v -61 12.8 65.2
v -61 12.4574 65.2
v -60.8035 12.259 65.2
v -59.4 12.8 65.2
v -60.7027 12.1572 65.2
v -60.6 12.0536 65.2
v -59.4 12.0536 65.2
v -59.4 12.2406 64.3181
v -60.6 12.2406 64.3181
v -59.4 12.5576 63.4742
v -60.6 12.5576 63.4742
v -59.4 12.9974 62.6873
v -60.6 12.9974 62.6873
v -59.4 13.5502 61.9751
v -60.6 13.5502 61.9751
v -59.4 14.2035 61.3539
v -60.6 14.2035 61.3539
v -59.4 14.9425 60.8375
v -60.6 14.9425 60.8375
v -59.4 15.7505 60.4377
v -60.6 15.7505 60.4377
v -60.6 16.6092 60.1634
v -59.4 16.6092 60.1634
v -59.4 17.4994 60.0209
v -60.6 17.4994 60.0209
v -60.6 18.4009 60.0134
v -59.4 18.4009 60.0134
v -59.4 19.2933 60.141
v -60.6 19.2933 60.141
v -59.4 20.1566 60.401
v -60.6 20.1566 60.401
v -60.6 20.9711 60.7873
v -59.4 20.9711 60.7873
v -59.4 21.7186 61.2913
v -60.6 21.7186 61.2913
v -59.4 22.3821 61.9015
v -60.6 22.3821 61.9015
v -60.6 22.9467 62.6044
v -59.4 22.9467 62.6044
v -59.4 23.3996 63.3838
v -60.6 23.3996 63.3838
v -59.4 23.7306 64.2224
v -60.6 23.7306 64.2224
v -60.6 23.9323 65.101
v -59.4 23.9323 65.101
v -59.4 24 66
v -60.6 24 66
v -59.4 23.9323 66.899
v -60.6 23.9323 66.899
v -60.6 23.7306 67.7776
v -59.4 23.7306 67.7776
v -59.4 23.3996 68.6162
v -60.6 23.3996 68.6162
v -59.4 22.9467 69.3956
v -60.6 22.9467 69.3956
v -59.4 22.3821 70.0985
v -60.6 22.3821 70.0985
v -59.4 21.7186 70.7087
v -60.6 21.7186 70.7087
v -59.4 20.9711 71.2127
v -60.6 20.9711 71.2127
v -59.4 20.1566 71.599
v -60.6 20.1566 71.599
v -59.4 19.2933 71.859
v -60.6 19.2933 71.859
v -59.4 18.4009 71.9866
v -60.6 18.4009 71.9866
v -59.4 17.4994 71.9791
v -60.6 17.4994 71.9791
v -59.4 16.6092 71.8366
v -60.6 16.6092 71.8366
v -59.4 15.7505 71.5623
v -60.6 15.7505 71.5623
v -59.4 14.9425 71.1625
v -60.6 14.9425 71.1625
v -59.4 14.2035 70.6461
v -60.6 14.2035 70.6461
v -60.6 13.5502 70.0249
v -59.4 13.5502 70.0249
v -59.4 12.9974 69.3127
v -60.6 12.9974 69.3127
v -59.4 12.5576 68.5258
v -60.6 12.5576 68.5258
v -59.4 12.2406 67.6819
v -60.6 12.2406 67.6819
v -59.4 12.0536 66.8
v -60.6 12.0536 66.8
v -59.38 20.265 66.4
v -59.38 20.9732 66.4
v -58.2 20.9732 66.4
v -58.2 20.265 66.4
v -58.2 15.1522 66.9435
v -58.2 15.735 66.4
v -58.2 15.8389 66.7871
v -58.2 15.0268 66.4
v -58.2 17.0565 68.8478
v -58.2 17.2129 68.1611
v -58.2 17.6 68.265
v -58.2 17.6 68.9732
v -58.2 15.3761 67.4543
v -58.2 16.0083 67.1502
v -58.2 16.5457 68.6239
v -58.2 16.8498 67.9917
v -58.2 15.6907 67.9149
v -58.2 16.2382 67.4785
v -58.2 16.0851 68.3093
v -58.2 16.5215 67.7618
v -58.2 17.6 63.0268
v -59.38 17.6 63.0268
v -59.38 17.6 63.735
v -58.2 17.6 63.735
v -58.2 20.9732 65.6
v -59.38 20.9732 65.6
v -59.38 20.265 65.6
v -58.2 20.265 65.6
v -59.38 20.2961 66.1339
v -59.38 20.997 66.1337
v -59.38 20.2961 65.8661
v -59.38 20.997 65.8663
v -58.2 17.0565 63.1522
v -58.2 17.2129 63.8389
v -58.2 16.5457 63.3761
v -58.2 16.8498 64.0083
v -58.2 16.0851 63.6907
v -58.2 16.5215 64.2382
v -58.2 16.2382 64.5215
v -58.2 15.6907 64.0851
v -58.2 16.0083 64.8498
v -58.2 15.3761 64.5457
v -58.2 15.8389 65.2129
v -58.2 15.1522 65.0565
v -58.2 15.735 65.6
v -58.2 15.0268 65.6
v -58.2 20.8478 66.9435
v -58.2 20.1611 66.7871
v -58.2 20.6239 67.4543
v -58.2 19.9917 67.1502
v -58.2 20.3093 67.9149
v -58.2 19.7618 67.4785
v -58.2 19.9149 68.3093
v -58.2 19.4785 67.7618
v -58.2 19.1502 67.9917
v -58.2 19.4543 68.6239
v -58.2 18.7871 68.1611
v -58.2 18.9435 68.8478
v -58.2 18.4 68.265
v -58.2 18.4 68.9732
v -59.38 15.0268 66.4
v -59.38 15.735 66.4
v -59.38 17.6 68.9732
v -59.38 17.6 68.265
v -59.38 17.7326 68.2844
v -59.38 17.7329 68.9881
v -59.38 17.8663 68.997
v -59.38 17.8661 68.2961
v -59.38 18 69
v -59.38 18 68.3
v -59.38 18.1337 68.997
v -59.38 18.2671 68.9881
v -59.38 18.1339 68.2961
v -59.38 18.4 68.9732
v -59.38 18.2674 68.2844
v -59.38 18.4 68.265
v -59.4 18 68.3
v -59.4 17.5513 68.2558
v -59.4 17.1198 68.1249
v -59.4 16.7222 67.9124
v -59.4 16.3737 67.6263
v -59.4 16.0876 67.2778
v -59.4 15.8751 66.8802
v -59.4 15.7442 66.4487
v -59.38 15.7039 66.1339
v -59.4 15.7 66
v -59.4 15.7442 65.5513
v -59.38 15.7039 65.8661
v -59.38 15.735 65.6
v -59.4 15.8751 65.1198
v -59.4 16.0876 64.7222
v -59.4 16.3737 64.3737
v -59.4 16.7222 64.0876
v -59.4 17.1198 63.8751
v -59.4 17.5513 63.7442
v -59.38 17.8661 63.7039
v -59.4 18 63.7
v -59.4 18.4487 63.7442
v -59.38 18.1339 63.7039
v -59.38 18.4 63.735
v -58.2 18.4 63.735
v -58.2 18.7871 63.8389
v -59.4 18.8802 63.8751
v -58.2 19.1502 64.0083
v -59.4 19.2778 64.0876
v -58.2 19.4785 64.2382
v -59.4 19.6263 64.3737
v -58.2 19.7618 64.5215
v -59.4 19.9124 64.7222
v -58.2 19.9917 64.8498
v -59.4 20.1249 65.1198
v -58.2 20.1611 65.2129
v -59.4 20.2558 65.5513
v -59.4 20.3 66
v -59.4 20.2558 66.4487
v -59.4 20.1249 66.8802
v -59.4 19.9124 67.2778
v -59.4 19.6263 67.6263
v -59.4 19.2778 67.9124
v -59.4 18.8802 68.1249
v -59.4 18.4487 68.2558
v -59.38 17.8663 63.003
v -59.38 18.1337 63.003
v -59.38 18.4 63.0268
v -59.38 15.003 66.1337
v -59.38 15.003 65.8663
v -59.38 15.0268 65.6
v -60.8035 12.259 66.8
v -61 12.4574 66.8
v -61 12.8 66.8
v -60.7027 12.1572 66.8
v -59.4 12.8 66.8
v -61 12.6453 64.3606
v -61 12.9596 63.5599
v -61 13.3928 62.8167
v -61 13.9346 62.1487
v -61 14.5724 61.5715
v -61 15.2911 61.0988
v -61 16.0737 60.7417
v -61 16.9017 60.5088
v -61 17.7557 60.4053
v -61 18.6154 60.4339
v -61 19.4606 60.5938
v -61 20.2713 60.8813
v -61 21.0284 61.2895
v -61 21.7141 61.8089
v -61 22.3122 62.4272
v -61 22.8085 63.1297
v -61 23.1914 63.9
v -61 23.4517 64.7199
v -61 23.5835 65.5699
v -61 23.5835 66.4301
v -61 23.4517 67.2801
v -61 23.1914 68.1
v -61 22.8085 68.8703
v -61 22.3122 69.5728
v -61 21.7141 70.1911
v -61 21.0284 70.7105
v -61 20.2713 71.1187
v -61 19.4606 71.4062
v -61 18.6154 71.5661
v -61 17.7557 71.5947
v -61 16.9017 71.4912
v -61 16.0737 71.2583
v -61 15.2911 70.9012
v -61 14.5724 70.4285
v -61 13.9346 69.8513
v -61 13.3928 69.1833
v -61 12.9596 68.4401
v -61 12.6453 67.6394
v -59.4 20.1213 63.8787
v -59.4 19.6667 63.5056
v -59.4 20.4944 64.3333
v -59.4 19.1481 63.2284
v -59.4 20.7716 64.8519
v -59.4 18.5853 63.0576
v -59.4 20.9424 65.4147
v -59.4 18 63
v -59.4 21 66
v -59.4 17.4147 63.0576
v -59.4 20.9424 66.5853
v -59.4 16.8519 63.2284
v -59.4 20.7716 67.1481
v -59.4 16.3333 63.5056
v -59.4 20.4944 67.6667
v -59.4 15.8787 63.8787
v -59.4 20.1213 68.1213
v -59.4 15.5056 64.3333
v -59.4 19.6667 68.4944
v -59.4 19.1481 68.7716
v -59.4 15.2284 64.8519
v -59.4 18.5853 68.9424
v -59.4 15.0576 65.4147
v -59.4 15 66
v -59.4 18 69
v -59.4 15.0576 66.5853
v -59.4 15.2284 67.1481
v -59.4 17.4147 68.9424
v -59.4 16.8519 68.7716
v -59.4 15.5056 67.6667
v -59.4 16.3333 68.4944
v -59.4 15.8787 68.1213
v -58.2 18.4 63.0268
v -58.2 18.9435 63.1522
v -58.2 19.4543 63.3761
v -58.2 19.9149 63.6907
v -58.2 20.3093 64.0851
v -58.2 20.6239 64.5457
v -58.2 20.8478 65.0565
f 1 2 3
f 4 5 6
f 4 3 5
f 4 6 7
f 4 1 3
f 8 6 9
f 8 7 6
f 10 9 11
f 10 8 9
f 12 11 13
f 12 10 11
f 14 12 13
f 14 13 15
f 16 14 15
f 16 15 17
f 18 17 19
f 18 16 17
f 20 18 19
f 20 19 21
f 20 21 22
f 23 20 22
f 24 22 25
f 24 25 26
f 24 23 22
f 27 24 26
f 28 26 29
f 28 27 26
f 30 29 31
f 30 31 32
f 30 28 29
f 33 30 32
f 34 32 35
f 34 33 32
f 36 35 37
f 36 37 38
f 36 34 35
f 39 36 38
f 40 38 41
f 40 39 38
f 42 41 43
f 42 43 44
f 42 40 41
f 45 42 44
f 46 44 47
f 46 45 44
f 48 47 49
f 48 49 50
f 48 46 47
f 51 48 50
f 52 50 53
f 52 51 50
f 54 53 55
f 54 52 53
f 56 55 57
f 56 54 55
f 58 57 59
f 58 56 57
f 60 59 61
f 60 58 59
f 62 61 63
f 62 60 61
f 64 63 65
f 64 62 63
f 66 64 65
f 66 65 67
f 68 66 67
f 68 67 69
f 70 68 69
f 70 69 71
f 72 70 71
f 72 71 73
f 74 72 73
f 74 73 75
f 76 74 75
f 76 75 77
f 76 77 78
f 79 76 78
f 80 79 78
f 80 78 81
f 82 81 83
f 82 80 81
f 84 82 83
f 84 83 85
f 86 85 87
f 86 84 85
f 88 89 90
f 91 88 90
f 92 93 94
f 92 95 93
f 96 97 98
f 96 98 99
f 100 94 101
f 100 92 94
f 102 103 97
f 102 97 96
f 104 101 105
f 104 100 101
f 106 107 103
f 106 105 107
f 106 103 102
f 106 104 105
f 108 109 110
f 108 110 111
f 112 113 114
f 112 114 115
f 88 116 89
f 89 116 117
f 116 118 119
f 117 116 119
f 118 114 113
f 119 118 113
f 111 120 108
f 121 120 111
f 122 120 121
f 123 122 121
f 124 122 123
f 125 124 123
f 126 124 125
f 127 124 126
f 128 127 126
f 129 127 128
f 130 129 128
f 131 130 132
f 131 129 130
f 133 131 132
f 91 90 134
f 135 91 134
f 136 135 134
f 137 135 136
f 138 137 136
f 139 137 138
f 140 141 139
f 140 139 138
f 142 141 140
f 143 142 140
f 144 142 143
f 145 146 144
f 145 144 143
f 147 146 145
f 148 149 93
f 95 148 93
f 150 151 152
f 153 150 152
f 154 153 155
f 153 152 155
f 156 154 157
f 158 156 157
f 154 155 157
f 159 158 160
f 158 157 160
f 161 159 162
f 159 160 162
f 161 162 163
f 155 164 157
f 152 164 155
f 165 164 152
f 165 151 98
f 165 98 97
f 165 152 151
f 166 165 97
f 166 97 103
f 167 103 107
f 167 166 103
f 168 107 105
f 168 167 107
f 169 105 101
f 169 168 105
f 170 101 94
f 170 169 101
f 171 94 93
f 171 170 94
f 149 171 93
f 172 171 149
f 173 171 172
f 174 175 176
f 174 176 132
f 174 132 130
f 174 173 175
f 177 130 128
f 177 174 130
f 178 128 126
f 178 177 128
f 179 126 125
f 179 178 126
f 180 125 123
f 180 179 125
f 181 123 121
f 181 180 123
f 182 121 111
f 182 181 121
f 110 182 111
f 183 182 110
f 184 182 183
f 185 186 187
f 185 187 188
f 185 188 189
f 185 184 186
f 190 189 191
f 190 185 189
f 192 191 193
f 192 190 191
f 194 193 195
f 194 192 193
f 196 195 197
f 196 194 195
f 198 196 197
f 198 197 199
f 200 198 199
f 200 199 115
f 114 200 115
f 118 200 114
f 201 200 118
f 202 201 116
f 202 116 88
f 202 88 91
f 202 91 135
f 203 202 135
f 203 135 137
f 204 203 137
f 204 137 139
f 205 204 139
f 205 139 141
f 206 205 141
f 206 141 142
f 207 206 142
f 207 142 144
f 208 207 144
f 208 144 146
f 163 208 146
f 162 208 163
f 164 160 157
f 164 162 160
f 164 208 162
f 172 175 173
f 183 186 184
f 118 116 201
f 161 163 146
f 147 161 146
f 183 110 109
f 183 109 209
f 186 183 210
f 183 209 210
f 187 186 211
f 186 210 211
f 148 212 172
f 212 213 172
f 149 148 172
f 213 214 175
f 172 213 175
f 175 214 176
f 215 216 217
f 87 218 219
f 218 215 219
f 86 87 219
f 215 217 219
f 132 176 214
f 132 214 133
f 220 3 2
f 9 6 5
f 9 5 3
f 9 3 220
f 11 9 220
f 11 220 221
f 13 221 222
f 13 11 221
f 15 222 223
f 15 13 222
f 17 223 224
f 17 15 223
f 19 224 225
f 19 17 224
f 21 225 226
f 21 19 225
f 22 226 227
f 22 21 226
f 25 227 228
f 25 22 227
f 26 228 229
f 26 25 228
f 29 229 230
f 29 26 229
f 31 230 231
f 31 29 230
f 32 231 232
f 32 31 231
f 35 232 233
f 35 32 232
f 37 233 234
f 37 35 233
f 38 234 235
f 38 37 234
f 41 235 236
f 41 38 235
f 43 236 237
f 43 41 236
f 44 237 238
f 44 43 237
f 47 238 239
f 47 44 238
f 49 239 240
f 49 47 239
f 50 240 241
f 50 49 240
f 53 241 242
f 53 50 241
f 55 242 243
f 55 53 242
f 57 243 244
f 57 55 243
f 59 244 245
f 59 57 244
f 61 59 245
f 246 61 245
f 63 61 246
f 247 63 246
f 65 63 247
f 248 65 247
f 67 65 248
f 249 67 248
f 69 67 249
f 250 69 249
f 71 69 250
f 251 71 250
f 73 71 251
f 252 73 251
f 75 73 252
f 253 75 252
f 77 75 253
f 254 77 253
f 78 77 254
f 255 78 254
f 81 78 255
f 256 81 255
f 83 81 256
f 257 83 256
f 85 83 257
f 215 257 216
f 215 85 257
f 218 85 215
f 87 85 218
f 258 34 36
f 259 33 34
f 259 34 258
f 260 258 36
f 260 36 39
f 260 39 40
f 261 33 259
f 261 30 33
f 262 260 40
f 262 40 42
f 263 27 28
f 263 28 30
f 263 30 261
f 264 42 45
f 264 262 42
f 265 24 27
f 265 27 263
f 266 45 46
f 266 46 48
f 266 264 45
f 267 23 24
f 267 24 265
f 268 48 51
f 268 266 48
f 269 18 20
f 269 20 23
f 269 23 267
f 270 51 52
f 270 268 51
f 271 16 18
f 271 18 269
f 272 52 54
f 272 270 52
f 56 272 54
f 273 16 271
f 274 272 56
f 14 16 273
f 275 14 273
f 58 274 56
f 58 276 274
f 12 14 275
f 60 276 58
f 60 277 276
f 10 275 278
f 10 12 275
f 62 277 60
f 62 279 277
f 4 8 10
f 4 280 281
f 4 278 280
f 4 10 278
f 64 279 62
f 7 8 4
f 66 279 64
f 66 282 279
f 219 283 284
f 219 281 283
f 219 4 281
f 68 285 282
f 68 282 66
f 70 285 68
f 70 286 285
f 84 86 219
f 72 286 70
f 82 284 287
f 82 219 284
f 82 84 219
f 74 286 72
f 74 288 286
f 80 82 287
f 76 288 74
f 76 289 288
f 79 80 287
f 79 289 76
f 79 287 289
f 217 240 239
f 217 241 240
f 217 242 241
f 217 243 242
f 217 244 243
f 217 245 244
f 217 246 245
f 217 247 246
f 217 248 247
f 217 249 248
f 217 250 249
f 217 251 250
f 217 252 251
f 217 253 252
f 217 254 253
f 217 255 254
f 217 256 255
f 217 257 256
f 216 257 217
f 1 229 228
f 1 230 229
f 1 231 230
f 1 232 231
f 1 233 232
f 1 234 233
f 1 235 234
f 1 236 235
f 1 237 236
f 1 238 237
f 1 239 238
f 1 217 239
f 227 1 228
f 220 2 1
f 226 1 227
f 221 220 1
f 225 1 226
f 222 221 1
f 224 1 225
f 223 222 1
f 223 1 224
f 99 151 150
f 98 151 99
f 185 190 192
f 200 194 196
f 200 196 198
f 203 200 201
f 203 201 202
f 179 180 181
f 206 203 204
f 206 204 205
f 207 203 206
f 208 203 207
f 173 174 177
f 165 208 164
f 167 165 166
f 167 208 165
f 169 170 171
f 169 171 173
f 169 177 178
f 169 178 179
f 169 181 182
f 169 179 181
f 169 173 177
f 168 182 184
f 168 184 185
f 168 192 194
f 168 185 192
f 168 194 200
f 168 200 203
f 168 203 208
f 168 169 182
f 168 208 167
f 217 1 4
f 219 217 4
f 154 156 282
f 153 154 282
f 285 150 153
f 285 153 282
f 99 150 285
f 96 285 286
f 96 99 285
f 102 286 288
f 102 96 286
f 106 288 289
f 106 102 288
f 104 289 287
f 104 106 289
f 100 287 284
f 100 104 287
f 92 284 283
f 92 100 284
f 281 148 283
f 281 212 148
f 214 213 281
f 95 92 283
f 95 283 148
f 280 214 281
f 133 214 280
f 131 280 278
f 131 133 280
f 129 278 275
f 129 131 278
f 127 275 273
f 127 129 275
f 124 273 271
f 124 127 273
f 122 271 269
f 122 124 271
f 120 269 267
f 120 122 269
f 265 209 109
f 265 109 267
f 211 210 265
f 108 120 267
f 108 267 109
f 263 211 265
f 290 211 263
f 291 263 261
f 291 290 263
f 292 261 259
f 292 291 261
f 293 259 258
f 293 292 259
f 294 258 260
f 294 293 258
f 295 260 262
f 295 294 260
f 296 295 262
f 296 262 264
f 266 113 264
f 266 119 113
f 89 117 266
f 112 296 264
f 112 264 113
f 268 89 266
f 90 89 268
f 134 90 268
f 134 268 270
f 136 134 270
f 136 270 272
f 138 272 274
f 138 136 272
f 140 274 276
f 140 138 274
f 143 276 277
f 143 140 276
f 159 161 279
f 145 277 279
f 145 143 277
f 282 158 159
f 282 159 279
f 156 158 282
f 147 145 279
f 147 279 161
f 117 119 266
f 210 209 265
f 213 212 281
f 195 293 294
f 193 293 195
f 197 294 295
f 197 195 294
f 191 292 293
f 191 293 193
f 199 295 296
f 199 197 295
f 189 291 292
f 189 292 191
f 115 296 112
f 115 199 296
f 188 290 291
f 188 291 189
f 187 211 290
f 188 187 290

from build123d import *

# Parameters (mm, degrees)
BOSS_EXTRUDE1_START = 62.8
SKETCH2_W           = 1.28
SKETCH2_H           = 0.8
BOSS_EXTRUDE1_DEPTH = 6.4
BOSS_EXTRUDE2_START = 65.6
SKETCH3_W           = 1.28
SKETCH3_H           = 6.4
BOSS_EXTRUDE2_DEPTH = 0.8
BOSS_EXTRUDE3_START = 65.2
SKETCH4_W           = 1.8
SKETCH4_H           = 0.9
BOSS_EXTRUDE3_DEPTH = 1.6


with BuildPart() as part:
    # Sketch1 → Revolve1 (revolve)
    with BuildSketch(Plane.XY.offset(66), mode=Mode.PRIVATE) as revolve1_sk:
        Polygon((-58.2, 20.3), (-59.4, 20.3), (-59.4, 18), (-61, 18), (-61, 23.6), (-60.6, 24), (-59.4, 24), (-59.4, 21), (-58.2, 21), align=None)
    revolve(revolve1_sk.sketch.rotate(Axis((-66, 18, 66), (1, 0, 0)), 90), axis=Axis((-66, 18, 66), (1, 0, 0)))


with BuildPart() as body_2:
    # Sketch2 → Boss-Extrude1 (new body)
    with BuildSketch(Plane.XY.offset(BOSS_EXTRUDE1_START)):
        with Locations((-58.74, 18)):
            Rectangle(SKETCH2_W, SKETCH2_H)
    extrude(amount=BOSS_EXTRUDE1_DEPTH)


with BuildPart() as part_1:
    add(part.part)

    # Combine1: cut body 2
    add(body_2.part, mode=Mode.SUBTRACT)


with BuildPart() as body_2_2:
    # Sketch3 → Boss-Extrude2 (new body)
    with BuildSketch(Plane.XY.offset(BOSS_EXTRUDE2_START)):
        with Locations((-58.74, 18)):
            Rectangle(SKETCH3_W, SKETCH3_H)
    extrude(amount=BOSS_EXTRUDE2_DEPTH)


with BuildPart() as part_2:
    add(part_1.part)

    # Combine2: cut body 2 2
    add(body_2_2.part, mode=Mode.SUBTRACT)


with BuildPart() as body_2_3:
    # Sketch4 → Boss-Extrude3 (new body)
    with BuildSketch(Plane.XY.offset(BOSS_EXTRUDE3_START)):
        with Locations((-60.2, 12.35)):
            Rectangle(SKETCH4_W, SKETCH4_H)
    extrude(amount=BOSS_EXTRUDE3_DEPTH)


with BuildPart() as part_3:
    add(part_2.part)

    # Combine3: cut body 2 3
    add(body_2_3.part, mode=Mode.SUBTRACT)


solid = part_3.part
